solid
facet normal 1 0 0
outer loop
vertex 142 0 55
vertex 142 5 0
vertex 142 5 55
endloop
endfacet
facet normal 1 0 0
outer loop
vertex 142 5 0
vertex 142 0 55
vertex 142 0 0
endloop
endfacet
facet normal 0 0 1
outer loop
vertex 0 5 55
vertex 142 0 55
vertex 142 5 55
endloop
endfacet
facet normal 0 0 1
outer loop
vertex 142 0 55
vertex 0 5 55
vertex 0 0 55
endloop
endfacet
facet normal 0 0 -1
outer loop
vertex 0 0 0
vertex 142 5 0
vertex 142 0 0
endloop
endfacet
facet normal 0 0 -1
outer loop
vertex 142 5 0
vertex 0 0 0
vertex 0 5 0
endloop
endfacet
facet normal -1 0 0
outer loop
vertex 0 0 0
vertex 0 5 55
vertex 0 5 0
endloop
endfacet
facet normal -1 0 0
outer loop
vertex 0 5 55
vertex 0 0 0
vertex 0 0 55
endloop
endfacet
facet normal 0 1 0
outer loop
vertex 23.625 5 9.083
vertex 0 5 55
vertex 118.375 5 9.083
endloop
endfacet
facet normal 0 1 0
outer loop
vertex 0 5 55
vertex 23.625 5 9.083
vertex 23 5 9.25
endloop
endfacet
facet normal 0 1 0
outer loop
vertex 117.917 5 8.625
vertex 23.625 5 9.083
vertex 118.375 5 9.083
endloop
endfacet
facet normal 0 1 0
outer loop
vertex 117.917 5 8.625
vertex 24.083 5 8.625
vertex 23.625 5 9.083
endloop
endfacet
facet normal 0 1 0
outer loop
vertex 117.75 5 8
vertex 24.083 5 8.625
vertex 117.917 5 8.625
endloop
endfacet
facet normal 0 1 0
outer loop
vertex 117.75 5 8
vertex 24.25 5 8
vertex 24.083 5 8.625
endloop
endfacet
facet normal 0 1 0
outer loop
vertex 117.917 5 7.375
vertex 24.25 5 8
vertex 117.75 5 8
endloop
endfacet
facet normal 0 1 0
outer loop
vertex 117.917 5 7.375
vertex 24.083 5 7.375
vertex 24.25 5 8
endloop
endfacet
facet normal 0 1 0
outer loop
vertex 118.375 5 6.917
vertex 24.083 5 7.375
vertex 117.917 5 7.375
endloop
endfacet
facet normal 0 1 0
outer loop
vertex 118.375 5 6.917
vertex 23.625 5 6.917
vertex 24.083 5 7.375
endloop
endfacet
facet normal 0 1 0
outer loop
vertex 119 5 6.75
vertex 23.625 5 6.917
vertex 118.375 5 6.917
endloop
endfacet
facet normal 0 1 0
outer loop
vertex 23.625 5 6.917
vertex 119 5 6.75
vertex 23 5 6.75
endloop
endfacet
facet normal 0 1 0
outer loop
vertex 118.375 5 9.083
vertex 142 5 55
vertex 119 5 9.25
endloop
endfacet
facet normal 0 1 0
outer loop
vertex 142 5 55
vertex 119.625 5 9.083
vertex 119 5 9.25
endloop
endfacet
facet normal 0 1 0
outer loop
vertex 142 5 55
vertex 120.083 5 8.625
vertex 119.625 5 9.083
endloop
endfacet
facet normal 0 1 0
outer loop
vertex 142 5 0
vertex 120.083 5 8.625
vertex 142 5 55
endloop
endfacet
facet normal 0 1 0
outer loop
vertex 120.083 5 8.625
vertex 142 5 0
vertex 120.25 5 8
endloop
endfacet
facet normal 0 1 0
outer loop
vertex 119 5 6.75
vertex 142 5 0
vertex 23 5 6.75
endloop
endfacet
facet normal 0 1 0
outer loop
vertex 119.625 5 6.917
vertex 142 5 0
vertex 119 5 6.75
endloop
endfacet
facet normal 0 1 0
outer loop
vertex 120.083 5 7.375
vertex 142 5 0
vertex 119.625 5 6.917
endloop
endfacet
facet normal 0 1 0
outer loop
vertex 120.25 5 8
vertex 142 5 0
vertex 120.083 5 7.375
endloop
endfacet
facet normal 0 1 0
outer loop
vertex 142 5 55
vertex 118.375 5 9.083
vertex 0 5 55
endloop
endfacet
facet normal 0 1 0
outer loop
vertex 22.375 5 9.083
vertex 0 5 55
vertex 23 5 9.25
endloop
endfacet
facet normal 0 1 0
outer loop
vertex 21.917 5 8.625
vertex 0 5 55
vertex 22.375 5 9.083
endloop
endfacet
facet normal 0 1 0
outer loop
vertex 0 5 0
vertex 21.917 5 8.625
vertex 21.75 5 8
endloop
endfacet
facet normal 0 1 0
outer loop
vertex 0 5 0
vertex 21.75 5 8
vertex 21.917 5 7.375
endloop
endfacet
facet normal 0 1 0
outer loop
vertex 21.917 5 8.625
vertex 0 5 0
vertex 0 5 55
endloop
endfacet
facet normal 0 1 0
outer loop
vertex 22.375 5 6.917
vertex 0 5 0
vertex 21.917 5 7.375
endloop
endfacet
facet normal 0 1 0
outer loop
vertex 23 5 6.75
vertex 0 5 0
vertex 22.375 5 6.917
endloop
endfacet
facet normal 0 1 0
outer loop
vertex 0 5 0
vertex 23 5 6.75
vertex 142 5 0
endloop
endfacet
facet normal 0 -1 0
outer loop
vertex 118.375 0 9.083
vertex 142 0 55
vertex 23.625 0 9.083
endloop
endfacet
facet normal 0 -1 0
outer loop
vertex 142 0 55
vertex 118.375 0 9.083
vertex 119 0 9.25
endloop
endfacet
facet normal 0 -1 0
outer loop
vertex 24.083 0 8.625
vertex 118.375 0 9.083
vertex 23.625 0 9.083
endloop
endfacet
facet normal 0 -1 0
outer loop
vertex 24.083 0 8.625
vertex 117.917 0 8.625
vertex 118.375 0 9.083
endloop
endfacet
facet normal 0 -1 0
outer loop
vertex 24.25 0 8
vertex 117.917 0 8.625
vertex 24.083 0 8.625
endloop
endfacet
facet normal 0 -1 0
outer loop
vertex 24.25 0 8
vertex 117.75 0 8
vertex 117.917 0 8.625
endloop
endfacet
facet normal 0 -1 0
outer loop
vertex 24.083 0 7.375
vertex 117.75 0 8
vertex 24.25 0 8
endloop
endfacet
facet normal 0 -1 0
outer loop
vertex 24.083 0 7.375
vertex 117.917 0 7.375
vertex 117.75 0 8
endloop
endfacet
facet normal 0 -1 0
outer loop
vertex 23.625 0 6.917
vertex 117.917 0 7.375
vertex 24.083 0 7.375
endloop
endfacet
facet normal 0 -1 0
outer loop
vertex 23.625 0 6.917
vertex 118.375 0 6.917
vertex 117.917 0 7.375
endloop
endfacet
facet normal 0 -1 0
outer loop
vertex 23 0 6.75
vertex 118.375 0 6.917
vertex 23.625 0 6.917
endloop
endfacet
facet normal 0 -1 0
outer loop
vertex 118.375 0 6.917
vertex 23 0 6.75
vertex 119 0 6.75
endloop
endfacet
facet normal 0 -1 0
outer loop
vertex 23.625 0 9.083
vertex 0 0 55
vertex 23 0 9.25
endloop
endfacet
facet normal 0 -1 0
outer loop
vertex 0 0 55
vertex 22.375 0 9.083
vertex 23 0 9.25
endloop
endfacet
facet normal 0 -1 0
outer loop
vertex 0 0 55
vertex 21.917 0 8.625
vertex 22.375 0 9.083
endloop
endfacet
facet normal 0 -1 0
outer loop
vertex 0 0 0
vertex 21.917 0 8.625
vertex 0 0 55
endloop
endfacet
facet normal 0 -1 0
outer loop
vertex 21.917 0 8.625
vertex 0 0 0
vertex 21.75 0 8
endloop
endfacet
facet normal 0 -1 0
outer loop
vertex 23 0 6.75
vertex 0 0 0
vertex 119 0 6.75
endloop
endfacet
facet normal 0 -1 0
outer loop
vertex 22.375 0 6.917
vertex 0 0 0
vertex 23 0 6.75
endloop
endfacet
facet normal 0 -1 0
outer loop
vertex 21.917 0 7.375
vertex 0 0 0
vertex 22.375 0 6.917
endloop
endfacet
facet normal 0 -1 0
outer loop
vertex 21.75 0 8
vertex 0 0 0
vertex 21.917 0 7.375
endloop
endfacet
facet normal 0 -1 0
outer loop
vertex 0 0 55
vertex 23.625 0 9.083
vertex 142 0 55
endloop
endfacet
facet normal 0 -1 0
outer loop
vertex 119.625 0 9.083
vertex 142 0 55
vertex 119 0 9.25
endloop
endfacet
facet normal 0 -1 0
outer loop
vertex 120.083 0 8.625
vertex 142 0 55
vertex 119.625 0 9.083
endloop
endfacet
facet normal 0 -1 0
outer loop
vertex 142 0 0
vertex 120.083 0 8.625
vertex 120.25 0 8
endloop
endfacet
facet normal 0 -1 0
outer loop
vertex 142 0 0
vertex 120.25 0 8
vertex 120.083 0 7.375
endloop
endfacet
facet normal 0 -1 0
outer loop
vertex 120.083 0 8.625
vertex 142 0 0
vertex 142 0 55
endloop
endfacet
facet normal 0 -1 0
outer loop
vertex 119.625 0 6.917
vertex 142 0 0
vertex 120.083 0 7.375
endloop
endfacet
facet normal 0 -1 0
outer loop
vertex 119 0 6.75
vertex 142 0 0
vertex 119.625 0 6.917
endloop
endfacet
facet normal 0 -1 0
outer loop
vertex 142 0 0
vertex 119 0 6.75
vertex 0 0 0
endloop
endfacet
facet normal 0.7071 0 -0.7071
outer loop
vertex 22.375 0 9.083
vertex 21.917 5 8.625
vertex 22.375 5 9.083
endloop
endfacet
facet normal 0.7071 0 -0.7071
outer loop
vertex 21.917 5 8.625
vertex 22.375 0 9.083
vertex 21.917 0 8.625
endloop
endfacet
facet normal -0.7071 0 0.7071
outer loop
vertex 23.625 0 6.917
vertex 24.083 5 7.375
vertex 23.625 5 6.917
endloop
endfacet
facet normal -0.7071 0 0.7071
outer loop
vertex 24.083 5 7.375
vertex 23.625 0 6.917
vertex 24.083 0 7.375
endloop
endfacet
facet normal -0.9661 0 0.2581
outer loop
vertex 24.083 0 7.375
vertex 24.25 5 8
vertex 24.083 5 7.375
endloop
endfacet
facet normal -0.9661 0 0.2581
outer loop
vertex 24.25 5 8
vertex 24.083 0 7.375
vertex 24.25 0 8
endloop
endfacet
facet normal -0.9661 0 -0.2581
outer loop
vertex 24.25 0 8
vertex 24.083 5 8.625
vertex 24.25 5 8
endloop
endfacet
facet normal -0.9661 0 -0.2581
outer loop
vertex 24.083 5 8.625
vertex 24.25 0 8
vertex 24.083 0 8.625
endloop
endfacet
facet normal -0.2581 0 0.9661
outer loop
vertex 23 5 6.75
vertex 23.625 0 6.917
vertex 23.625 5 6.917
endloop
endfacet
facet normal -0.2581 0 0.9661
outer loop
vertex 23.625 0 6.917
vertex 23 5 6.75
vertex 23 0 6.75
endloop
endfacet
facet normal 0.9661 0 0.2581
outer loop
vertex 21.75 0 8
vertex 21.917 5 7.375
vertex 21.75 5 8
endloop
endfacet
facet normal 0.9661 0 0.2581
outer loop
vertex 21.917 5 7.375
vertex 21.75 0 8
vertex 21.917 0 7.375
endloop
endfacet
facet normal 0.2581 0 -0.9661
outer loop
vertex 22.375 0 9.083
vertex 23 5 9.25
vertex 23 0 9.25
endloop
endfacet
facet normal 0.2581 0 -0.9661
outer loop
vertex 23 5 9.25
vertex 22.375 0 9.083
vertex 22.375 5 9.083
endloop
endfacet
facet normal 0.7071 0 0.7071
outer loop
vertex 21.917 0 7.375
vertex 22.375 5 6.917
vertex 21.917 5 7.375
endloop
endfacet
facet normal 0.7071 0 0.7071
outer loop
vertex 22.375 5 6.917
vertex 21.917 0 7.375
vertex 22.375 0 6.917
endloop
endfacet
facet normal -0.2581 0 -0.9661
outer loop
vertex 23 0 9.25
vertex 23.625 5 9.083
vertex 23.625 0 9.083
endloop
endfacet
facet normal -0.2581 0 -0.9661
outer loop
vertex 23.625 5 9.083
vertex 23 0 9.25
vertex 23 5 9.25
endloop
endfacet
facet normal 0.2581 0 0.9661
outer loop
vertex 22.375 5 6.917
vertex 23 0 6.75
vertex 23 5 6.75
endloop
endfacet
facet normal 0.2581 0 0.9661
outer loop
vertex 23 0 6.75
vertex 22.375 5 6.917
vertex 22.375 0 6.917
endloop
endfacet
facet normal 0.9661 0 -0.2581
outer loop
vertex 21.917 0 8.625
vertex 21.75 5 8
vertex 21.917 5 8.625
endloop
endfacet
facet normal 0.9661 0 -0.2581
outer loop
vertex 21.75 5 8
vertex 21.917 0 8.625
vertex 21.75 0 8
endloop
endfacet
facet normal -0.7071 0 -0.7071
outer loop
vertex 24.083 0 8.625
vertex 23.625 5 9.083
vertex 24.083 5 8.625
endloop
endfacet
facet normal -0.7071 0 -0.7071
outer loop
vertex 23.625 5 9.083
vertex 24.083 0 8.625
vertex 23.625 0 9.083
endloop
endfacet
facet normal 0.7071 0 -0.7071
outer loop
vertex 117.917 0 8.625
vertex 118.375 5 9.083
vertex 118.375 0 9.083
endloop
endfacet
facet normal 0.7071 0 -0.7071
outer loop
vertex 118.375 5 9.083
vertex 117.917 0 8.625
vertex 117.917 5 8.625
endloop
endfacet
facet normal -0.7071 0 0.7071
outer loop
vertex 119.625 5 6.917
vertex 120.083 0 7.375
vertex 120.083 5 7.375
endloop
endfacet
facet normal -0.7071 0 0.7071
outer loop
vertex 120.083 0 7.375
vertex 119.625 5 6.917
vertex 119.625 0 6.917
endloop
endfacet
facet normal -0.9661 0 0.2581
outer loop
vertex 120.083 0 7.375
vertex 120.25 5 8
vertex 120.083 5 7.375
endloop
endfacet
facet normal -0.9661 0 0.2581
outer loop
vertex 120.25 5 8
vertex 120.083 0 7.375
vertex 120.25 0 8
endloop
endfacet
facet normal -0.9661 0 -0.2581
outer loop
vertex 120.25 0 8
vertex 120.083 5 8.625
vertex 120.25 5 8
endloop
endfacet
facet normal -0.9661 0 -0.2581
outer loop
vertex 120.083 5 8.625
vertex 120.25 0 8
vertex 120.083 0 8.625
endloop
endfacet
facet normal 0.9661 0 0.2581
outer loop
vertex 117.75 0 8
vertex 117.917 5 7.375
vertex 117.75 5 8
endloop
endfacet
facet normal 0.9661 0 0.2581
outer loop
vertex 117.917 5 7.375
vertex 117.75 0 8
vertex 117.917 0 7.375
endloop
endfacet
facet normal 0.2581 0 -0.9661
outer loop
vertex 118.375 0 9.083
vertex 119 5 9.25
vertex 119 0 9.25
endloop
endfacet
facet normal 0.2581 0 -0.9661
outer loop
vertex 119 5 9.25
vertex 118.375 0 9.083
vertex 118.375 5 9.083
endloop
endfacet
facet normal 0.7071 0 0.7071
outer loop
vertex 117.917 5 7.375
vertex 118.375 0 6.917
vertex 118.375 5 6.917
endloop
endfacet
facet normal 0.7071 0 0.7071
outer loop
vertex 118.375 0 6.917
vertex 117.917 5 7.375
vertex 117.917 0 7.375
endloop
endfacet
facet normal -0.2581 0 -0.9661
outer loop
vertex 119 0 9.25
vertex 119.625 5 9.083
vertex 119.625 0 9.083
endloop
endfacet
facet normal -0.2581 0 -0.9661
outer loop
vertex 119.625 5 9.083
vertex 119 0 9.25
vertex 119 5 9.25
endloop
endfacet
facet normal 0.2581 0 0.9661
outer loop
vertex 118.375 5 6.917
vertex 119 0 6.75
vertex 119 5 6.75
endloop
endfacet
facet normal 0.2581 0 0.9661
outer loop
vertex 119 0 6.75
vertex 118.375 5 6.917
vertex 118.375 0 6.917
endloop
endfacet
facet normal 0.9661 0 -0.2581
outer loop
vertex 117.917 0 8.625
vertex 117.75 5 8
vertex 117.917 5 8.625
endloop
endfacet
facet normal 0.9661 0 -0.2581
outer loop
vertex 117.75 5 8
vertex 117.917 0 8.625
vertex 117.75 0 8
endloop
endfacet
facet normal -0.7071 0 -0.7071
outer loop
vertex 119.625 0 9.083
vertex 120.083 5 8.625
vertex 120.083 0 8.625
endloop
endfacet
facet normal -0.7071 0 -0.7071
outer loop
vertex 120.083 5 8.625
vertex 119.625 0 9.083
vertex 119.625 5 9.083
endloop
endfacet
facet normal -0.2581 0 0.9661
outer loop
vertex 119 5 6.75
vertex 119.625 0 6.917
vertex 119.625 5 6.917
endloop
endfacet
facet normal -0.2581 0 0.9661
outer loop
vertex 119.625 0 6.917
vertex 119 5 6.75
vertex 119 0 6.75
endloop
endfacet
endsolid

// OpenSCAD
$fn=12;
difference(){
cube([142,5,55]);
translate([23,-100,8])
rotate([-90,0,0])cylinder(d=2.5,h=200);
translate([119,-100,8])
rotate([-90,0,0])cylinder(d=2.5,h=200);
}    
